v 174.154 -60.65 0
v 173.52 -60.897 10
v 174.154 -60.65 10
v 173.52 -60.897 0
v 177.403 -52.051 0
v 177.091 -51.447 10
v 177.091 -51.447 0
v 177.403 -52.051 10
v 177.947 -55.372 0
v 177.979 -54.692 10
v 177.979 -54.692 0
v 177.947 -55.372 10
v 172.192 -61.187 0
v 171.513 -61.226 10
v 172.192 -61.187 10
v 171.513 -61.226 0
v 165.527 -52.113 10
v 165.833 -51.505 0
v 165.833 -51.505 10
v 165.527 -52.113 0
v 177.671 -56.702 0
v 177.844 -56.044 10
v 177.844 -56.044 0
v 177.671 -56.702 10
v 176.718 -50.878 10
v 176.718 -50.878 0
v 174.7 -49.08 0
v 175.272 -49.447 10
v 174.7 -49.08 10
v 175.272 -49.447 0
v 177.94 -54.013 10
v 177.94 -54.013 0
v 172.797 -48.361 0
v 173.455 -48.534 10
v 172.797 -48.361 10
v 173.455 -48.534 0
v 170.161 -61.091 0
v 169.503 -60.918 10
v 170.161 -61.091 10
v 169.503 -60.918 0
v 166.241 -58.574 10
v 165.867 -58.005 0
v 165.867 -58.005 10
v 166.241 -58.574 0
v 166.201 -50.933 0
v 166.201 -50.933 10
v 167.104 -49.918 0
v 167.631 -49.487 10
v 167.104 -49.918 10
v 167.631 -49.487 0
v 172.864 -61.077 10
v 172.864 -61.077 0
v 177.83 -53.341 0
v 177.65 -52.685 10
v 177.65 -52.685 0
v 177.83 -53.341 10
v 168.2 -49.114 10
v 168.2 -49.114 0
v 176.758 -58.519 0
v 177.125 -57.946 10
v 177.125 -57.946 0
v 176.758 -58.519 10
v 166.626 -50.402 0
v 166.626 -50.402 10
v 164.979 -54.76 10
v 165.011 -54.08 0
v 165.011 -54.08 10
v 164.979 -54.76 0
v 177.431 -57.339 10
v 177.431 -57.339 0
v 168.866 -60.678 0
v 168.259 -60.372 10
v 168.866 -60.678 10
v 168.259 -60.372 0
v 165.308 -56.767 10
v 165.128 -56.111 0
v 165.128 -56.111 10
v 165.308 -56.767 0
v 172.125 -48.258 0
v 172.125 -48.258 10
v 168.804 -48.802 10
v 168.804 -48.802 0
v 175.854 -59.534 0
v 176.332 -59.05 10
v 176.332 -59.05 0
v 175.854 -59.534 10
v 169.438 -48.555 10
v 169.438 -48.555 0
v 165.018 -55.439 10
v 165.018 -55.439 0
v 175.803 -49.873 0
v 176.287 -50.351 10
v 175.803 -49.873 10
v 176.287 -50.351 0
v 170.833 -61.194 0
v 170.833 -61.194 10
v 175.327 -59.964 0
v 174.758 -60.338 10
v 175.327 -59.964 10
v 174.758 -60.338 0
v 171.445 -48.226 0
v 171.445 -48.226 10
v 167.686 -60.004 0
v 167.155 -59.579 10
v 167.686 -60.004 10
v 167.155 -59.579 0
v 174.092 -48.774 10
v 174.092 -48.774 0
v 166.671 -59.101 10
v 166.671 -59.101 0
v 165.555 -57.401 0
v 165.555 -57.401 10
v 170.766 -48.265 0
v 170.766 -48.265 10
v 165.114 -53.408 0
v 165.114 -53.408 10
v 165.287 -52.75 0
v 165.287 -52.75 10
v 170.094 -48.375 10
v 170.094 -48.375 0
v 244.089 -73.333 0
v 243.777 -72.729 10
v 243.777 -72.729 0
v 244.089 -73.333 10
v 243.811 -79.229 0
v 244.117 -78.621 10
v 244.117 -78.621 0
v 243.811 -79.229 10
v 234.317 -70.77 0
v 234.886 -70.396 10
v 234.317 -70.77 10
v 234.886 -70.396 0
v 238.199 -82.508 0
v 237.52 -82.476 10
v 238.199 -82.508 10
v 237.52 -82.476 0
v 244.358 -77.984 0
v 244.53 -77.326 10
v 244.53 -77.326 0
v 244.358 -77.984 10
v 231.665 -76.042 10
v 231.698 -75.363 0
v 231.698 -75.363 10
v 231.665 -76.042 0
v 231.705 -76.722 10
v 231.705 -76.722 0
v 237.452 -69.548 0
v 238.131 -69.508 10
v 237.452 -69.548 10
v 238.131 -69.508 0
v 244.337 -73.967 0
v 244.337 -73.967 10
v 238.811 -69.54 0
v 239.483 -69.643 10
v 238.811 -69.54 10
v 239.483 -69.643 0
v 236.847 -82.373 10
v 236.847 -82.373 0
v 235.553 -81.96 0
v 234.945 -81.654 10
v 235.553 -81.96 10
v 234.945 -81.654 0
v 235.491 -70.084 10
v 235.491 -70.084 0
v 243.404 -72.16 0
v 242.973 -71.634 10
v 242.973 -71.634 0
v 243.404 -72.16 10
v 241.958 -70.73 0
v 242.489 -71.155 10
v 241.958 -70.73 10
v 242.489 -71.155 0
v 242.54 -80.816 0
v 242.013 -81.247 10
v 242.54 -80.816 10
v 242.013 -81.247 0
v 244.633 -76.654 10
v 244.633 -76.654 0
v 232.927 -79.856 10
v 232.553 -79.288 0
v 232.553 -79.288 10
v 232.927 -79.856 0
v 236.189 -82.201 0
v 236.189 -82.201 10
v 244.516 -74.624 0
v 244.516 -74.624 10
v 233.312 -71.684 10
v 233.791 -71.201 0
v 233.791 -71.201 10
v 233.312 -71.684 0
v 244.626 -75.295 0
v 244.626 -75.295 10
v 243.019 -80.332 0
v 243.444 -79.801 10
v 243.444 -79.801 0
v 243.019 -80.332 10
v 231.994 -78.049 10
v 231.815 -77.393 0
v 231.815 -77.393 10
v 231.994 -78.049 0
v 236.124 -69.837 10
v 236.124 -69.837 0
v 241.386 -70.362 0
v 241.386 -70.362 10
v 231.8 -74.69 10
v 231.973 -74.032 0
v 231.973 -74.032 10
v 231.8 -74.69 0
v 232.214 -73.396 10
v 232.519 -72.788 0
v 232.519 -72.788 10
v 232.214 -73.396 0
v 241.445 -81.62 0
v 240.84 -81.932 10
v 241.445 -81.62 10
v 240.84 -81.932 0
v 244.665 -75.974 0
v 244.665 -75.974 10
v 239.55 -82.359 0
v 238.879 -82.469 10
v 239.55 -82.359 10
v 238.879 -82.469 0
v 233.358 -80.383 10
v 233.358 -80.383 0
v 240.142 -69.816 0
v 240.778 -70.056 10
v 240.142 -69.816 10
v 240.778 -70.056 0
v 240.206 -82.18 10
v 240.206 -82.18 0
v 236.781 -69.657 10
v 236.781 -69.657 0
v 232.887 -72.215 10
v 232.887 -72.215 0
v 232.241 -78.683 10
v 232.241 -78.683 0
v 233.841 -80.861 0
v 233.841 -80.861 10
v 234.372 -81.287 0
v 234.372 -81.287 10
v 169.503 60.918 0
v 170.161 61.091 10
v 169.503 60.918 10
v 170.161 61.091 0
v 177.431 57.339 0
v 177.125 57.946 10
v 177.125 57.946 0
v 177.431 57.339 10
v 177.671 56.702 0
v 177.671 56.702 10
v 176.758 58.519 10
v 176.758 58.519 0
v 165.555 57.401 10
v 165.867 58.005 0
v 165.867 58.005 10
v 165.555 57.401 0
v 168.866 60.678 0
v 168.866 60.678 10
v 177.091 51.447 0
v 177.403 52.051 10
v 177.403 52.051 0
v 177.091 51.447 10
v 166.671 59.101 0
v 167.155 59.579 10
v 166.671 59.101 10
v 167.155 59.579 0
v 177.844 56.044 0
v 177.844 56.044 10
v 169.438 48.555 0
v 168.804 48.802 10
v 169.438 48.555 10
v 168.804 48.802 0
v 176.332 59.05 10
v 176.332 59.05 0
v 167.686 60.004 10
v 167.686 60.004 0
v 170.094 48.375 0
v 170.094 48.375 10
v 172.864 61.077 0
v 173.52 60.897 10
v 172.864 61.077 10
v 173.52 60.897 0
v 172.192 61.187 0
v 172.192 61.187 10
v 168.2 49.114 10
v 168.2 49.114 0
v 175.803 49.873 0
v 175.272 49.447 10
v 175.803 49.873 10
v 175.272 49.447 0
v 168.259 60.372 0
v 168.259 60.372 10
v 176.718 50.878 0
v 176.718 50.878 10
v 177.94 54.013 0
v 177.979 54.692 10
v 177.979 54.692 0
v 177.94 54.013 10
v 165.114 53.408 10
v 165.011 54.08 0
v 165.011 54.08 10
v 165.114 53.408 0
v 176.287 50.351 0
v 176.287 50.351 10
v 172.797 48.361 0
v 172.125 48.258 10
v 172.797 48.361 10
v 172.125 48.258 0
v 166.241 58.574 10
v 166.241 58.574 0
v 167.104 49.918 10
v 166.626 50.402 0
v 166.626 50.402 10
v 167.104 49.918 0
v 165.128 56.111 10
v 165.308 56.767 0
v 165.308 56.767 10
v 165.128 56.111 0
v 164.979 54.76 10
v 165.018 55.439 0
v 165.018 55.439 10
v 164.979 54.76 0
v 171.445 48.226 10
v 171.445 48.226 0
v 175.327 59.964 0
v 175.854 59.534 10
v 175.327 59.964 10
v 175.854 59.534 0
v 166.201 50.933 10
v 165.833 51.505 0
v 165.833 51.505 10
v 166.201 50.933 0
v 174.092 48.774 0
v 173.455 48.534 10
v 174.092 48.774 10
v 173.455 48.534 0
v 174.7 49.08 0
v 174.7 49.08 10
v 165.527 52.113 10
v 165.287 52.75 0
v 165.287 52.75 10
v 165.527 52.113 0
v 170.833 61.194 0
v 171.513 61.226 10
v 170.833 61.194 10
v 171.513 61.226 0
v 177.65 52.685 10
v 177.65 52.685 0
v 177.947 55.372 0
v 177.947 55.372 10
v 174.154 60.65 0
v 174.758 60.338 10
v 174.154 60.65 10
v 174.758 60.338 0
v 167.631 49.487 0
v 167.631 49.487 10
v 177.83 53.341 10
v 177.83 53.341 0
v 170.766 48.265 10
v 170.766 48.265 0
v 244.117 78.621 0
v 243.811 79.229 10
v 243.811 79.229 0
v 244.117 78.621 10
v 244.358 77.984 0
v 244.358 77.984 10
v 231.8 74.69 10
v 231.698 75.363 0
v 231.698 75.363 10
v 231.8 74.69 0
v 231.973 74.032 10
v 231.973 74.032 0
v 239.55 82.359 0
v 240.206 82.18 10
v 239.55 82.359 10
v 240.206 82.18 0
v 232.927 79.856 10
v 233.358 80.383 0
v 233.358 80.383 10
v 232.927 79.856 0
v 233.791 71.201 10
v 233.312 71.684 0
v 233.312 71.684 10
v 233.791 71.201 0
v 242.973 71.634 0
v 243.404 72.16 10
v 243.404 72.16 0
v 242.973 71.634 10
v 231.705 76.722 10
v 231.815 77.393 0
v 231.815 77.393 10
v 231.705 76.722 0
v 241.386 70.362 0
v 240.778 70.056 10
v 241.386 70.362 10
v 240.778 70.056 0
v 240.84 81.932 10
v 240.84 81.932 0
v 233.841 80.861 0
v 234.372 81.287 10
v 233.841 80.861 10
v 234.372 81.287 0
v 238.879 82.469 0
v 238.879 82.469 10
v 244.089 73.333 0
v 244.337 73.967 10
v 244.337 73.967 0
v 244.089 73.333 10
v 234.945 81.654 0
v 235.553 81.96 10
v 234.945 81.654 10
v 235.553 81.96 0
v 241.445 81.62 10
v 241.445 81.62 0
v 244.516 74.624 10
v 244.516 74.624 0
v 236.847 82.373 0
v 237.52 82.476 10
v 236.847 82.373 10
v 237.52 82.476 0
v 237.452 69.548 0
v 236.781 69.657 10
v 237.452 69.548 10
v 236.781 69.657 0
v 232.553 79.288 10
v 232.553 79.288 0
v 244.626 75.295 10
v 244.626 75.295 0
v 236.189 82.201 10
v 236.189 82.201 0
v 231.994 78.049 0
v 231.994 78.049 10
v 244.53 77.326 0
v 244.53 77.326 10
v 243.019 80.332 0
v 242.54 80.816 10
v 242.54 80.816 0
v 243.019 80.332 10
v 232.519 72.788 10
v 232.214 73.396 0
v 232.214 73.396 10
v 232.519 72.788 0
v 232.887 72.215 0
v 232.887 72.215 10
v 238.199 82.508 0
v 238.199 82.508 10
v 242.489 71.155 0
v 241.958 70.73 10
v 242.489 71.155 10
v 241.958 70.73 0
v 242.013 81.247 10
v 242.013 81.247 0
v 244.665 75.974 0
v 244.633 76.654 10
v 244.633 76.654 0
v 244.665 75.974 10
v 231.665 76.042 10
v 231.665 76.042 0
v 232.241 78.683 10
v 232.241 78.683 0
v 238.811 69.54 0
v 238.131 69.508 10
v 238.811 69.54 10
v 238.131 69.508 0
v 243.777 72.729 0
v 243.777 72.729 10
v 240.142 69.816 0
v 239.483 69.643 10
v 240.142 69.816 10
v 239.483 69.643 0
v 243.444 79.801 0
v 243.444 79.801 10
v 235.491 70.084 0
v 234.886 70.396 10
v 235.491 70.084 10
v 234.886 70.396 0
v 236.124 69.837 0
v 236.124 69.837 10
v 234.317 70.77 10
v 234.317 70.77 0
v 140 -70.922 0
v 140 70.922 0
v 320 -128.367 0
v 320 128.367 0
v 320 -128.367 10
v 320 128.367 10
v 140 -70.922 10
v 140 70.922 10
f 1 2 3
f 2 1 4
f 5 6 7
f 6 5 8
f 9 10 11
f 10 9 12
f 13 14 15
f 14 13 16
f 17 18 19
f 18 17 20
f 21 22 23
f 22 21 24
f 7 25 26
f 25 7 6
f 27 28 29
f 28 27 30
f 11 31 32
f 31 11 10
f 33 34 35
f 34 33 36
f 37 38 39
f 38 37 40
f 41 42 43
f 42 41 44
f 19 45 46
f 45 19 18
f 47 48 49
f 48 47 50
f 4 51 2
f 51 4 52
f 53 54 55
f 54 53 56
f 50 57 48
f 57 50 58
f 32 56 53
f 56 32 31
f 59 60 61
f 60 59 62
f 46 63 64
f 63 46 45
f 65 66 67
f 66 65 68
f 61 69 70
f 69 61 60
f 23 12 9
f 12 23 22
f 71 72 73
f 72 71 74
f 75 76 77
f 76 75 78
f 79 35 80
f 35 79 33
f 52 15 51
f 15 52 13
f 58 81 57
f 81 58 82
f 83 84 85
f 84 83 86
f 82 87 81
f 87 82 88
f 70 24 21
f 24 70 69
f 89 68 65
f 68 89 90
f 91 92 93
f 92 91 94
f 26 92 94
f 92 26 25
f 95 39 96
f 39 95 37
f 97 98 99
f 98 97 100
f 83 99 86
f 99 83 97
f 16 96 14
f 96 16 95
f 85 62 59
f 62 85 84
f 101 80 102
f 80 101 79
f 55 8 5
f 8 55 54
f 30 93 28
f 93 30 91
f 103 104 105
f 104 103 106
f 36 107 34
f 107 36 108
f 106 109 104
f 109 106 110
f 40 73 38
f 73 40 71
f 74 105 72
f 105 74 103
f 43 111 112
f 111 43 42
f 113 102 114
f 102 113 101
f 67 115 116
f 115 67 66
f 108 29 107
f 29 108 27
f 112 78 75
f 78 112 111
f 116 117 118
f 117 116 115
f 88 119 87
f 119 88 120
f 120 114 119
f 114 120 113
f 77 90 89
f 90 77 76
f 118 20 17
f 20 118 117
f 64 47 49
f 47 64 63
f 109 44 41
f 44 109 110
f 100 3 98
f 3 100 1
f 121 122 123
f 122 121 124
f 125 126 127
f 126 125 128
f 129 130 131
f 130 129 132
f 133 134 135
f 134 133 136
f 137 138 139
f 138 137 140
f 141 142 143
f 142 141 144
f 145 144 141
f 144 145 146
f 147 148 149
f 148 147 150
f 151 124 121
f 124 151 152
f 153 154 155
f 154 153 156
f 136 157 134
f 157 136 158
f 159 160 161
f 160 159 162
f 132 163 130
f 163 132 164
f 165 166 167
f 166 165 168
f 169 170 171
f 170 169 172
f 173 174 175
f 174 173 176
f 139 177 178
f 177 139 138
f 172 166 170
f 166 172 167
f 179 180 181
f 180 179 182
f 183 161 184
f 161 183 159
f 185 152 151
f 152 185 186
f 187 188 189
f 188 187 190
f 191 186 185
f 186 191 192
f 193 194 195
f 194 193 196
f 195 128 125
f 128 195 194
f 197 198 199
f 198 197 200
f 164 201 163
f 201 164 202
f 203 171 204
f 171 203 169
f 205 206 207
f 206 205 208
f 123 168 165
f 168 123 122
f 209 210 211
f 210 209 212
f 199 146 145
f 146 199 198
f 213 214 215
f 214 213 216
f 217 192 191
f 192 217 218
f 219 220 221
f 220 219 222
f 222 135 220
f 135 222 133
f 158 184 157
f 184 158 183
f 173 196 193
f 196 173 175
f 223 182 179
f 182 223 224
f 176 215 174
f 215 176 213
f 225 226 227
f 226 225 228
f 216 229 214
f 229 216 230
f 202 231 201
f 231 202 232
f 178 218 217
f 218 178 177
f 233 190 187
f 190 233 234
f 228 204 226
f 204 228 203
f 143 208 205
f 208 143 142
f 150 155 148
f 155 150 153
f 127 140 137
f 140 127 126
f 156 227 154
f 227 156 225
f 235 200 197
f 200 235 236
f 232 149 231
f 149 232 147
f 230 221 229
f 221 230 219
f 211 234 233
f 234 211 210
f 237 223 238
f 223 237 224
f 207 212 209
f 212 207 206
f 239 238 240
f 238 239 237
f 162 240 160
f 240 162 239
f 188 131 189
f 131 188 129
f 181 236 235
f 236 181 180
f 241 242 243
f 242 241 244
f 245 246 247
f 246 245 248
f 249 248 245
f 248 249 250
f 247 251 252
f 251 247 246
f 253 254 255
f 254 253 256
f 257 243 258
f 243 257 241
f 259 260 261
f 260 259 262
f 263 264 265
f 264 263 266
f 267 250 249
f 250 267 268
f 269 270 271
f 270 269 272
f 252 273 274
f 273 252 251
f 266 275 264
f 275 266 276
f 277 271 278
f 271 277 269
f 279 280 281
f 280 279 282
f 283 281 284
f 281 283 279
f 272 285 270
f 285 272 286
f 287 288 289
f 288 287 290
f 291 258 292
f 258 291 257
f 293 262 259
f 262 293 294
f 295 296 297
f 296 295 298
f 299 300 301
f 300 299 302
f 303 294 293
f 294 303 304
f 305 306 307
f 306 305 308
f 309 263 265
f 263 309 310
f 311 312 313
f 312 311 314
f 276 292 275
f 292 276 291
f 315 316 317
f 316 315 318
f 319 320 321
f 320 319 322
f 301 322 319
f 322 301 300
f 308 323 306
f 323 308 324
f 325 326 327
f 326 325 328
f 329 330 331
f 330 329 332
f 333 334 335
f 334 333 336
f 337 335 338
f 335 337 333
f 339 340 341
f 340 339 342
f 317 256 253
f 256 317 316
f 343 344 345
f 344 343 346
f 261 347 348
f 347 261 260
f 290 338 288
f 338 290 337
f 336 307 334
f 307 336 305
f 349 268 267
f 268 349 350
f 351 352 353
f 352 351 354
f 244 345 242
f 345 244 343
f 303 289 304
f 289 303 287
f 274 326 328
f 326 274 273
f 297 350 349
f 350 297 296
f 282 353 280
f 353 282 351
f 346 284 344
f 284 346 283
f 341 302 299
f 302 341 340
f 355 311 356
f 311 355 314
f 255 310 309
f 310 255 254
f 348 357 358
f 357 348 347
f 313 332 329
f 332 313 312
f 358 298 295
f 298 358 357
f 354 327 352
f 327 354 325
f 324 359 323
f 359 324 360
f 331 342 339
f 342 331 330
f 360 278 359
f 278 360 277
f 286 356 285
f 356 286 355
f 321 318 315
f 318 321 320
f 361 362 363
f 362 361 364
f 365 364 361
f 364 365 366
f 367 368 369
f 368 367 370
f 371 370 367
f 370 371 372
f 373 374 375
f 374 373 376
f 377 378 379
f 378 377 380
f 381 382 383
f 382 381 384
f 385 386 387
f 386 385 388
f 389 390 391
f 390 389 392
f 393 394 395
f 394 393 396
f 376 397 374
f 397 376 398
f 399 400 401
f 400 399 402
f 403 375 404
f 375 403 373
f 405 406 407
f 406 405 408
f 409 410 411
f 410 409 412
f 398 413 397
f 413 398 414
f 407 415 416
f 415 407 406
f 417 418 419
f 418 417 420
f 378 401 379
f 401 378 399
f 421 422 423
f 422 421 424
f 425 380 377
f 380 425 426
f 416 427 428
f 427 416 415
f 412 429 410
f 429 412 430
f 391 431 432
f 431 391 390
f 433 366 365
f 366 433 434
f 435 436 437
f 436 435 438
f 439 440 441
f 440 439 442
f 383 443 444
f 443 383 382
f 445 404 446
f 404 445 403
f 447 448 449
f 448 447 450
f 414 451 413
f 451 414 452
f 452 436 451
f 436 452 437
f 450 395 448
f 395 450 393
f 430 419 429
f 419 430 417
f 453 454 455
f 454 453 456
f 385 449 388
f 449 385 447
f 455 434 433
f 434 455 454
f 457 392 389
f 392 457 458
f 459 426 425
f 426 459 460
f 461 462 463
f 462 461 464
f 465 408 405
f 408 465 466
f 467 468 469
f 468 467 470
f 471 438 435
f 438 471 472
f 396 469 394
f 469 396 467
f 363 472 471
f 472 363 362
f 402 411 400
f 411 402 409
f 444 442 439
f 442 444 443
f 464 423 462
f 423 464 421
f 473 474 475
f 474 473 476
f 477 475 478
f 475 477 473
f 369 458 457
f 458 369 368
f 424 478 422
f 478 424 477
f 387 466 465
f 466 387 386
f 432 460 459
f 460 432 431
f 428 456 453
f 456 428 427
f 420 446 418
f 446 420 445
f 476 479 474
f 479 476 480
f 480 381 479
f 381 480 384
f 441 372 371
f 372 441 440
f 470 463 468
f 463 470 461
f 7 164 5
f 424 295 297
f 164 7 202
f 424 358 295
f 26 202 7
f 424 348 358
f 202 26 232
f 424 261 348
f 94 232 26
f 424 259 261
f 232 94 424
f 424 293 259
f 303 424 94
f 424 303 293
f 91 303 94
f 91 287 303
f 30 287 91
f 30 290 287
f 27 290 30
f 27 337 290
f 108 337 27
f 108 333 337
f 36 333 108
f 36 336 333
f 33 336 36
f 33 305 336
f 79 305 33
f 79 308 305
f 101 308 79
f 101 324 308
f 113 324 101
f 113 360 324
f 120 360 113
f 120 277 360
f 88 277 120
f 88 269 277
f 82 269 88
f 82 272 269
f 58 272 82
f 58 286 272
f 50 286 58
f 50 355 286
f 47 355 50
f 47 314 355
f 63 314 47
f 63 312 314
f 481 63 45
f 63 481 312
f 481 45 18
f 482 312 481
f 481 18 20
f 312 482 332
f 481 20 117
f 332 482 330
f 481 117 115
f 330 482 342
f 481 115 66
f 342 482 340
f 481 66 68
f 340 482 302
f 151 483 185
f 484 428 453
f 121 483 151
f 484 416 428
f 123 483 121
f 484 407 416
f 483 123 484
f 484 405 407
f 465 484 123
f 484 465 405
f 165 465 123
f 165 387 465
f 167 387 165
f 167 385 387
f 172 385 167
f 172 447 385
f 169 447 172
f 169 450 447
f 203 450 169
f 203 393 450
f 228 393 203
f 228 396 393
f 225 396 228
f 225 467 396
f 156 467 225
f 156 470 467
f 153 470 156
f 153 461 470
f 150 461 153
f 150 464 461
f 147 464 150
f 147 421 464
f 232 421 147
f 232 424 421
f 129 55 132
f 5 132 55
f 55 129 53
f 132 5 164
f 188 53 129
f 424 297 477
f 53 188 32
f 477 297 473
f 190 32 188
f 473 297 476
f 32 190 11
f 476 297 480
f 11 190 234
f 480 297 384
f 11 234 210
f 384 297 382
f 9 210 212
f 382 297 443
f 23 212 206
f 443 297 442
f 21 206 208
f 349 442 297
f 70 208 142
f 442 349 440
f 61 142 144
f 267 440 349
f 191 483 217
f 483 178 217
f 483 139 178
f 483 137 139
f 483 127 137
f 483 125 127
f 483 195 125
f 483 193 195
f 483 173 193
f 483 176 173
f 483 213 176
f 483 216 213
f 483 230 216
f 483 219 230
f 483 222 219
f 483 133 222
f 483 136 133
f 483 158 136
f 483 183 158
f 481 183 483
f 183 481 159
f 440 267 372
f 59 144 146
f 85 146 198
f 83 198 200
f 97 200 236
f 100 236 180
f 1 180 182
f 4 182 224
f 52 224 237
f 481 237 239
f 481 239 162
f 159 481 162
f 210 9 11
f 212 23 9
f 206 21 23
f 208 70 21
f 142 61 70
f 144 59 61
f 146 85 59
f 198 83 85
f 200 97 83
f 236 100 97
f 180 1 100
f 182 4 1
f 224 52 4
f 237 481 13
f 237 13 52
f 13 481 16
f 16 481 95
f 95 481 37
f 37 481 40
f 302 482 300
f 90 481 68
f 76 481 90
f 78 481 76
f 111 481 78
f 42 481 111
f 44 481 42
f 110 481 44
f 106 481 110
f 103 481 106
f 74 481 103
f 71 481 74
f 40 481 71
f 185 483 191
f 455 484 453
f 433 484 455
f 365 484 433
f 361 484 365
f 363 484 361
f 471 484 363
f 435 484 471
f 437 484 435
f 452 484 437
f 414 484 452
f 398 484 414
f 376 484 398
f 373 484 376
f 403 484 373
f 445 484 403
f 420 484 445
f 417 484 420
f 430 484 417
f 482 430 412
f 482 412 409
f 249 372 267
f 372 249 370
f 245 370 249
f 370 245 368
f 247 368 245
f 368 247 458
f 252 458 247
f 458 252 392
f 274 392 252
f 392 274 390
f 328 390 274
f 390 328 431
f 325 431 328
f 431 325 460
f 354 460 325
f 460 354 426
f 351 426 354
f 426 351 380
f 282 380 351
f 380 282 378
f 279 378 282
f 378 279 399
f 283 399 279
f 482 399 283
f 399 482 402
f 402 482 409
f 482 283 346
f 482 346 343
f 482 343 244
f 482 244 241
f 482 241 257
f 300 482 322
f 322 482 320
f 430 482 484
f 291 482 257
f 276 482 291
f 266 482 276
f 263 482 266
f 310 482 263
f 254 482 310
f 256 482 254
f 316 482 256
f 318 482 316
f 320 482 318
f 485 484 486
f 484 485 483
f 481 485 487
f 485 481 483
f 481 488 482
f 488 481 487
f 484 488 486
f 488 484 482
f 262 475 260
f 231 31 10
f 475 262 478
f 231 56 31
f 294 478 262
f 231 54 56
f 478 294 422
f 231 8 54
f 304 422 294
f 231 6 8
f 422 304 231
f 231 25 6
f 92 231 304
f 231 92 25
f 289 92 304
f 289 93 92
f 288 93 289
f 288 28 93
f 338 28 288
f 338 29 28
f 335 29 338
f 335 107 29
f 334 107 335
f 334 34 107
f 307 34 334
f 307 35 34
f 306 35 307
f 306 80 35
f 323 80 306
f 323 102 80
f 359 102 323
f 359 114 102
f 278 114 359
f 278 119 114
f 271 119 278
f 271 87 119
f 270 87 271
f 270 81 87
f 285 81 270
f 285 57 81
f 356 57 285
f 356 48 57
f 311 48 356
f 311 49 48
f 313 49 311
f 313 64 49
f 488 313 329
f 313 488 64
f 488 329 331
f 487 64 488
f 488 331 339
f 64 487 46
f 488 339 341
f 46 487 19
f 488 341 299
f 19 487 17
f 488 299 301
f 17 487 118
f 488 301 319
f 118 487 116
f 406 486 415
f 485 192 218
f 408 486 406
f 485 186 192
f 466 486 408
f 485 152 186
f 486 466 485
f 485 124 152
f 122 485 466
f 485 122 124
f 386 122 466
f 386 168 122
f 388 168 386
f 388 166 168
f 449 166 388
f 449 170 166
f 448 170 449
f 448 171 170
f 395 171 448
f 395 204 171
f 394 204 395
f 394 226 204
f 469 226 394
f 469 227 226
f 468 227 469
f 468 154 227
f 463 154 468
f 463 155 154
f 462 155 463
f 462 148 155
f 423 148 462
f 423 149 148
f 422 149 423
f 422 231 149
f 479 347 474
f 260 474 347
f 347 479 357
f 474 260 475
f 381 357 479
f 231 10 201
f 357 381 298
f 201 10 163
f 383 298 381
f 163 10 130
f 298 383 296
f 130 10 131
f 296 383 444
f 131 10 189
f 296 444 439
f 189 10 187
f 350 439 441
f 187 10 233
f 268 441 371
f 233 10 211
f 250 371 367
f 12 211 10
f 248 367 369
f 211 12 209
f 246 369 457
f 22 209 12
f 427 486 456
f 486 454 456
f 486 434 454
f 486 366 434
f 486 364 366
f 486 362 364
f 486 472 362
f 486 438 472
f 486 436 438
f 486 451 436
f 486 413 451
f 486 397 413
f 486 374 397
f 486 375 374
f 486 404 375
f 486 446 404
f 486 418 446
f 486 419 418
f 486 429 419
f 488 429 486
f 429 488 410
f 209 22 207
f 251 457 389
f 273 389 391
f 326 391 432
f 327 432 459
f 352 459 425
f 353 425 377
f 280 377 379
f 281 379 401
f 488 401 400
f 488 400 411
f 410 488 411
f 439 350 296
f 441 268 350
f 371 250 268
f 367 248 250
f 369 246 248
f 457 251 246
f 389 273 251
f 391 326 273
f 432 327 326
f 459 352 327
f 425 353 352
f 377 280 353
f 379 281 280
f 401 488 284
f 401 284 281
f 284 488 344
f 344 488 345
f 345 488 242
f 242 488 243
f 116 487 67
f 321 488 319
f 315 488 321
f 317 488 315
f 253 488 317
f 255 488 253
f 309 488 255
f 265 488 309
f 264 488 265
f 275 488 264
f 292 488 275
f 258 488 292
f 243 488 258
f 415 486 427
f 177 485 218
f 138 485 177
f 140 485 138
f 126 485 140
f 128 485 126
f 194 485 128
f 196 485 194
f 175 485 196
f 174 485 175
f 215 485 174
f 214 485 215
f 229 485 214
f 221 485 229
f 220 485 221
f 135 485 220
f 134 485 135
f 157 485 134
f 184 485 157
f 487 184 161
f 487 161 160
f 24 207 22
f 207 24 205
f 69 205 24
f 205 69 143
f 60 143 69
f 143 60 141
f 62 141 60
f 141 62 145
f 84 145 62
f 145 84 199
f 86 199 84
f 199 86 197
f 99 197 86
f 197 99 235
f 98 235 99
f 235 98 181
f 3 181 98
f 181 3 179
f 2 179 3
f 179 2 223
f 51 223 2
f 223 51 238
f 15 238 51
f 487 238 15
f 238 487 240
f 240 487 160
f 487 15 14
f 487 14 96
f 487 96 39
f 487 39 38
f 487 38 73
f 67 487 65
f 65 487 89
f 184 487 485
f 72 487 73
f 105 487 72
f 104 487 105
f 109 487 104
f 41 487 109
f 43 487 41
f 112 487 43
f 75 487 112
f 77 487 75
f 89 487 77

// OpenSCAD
/*
 * Offroad Adventure Trailer - V-Drawbar Apex Plate
 *
 * 10 mm 6082-T6 aluminum, CNC milled, used as a TOP+BOTTOM SANDWICH.
 * ONE simple trapezoidal plate laid straight over BOTH square-cut arm
 * ends where they converge: the edges just follow the tubes' outer
 * edges, two M12 through-bolts per arm (internal crush sleeves in the
 * tubes, as everywhere in the frame).
 *
 * This plate pair is what makes the V-drawbar both WELD-free and
 * MITER-free: the arms are plain straight VKR 50x50x3 sticks and all
 * of the V geometry lives in this one flat part.
 *
 * The coupling-head mounting is deliberately NOT modeled yet (open
 * design point) — the plate simply stops just ahead of the tube tips.
 *
 * Local origin = the arms' centerline convergence point; the apex
 * points toward -X, symmetric about y=0. The square-cut tube tips sit
 * ~152 mm out from the origin (frame.scad: v_tip_trim), leaving a
 * ~40 mm clear gap between the tubes at the apex — cut-length slack
 * for manufacturing/assembly; the plate pair bridges it.
 *
 * Sizing: check_v_drawbar() in scripts/beam_check.py — bolt bearing
 * governs; the plate itself is lightly loaded.
 */

$fn = 60;

module v_apex_plate(
    tube_w = 50,        // Width of the VKR arms
    plate_t = 10,       // Plate thickness (top and bottom are identical)
    theta = 17.7,       // Arm half-angle, deg (frame.scad: atan(575/1800))
    front_x = 140,      // Front edge (just ahead of the ~152 mm tube tips)
    back_x = 320,       // Rear edge along the centerline
    hole_dia = 13,      // M12 clearance, drilled/reamed after milling
    arm_holes = [180, 250]   // Hole positions along each arm centerline
) {
    // Outer edge of a tube at centerline distance x from the convergence
    function half_w(x) = x * tan(theta) + (tube_w / 2) / cos(theta);

    difference() {
        linear_extrude(plate_t)
            polygon([
                [front_x, -half_w(front_x)],
                [back_x,  -half_w(back_x)],
                [back_x,   half_w(back_x)],
                [front_x,  half_w(front_x)]
            ]);
        // Two bolts per arm, on the arm centerlines
        for (s = [-1, 1], d = arm_holes)
            rotate([0, 0, s * theta])
                translate([d, 0, -1])
                    cylinder(d = hole_dia, h = plate_t + 2);
    }
}

// Renders if the file is opened standalone
v_apex_plate();
